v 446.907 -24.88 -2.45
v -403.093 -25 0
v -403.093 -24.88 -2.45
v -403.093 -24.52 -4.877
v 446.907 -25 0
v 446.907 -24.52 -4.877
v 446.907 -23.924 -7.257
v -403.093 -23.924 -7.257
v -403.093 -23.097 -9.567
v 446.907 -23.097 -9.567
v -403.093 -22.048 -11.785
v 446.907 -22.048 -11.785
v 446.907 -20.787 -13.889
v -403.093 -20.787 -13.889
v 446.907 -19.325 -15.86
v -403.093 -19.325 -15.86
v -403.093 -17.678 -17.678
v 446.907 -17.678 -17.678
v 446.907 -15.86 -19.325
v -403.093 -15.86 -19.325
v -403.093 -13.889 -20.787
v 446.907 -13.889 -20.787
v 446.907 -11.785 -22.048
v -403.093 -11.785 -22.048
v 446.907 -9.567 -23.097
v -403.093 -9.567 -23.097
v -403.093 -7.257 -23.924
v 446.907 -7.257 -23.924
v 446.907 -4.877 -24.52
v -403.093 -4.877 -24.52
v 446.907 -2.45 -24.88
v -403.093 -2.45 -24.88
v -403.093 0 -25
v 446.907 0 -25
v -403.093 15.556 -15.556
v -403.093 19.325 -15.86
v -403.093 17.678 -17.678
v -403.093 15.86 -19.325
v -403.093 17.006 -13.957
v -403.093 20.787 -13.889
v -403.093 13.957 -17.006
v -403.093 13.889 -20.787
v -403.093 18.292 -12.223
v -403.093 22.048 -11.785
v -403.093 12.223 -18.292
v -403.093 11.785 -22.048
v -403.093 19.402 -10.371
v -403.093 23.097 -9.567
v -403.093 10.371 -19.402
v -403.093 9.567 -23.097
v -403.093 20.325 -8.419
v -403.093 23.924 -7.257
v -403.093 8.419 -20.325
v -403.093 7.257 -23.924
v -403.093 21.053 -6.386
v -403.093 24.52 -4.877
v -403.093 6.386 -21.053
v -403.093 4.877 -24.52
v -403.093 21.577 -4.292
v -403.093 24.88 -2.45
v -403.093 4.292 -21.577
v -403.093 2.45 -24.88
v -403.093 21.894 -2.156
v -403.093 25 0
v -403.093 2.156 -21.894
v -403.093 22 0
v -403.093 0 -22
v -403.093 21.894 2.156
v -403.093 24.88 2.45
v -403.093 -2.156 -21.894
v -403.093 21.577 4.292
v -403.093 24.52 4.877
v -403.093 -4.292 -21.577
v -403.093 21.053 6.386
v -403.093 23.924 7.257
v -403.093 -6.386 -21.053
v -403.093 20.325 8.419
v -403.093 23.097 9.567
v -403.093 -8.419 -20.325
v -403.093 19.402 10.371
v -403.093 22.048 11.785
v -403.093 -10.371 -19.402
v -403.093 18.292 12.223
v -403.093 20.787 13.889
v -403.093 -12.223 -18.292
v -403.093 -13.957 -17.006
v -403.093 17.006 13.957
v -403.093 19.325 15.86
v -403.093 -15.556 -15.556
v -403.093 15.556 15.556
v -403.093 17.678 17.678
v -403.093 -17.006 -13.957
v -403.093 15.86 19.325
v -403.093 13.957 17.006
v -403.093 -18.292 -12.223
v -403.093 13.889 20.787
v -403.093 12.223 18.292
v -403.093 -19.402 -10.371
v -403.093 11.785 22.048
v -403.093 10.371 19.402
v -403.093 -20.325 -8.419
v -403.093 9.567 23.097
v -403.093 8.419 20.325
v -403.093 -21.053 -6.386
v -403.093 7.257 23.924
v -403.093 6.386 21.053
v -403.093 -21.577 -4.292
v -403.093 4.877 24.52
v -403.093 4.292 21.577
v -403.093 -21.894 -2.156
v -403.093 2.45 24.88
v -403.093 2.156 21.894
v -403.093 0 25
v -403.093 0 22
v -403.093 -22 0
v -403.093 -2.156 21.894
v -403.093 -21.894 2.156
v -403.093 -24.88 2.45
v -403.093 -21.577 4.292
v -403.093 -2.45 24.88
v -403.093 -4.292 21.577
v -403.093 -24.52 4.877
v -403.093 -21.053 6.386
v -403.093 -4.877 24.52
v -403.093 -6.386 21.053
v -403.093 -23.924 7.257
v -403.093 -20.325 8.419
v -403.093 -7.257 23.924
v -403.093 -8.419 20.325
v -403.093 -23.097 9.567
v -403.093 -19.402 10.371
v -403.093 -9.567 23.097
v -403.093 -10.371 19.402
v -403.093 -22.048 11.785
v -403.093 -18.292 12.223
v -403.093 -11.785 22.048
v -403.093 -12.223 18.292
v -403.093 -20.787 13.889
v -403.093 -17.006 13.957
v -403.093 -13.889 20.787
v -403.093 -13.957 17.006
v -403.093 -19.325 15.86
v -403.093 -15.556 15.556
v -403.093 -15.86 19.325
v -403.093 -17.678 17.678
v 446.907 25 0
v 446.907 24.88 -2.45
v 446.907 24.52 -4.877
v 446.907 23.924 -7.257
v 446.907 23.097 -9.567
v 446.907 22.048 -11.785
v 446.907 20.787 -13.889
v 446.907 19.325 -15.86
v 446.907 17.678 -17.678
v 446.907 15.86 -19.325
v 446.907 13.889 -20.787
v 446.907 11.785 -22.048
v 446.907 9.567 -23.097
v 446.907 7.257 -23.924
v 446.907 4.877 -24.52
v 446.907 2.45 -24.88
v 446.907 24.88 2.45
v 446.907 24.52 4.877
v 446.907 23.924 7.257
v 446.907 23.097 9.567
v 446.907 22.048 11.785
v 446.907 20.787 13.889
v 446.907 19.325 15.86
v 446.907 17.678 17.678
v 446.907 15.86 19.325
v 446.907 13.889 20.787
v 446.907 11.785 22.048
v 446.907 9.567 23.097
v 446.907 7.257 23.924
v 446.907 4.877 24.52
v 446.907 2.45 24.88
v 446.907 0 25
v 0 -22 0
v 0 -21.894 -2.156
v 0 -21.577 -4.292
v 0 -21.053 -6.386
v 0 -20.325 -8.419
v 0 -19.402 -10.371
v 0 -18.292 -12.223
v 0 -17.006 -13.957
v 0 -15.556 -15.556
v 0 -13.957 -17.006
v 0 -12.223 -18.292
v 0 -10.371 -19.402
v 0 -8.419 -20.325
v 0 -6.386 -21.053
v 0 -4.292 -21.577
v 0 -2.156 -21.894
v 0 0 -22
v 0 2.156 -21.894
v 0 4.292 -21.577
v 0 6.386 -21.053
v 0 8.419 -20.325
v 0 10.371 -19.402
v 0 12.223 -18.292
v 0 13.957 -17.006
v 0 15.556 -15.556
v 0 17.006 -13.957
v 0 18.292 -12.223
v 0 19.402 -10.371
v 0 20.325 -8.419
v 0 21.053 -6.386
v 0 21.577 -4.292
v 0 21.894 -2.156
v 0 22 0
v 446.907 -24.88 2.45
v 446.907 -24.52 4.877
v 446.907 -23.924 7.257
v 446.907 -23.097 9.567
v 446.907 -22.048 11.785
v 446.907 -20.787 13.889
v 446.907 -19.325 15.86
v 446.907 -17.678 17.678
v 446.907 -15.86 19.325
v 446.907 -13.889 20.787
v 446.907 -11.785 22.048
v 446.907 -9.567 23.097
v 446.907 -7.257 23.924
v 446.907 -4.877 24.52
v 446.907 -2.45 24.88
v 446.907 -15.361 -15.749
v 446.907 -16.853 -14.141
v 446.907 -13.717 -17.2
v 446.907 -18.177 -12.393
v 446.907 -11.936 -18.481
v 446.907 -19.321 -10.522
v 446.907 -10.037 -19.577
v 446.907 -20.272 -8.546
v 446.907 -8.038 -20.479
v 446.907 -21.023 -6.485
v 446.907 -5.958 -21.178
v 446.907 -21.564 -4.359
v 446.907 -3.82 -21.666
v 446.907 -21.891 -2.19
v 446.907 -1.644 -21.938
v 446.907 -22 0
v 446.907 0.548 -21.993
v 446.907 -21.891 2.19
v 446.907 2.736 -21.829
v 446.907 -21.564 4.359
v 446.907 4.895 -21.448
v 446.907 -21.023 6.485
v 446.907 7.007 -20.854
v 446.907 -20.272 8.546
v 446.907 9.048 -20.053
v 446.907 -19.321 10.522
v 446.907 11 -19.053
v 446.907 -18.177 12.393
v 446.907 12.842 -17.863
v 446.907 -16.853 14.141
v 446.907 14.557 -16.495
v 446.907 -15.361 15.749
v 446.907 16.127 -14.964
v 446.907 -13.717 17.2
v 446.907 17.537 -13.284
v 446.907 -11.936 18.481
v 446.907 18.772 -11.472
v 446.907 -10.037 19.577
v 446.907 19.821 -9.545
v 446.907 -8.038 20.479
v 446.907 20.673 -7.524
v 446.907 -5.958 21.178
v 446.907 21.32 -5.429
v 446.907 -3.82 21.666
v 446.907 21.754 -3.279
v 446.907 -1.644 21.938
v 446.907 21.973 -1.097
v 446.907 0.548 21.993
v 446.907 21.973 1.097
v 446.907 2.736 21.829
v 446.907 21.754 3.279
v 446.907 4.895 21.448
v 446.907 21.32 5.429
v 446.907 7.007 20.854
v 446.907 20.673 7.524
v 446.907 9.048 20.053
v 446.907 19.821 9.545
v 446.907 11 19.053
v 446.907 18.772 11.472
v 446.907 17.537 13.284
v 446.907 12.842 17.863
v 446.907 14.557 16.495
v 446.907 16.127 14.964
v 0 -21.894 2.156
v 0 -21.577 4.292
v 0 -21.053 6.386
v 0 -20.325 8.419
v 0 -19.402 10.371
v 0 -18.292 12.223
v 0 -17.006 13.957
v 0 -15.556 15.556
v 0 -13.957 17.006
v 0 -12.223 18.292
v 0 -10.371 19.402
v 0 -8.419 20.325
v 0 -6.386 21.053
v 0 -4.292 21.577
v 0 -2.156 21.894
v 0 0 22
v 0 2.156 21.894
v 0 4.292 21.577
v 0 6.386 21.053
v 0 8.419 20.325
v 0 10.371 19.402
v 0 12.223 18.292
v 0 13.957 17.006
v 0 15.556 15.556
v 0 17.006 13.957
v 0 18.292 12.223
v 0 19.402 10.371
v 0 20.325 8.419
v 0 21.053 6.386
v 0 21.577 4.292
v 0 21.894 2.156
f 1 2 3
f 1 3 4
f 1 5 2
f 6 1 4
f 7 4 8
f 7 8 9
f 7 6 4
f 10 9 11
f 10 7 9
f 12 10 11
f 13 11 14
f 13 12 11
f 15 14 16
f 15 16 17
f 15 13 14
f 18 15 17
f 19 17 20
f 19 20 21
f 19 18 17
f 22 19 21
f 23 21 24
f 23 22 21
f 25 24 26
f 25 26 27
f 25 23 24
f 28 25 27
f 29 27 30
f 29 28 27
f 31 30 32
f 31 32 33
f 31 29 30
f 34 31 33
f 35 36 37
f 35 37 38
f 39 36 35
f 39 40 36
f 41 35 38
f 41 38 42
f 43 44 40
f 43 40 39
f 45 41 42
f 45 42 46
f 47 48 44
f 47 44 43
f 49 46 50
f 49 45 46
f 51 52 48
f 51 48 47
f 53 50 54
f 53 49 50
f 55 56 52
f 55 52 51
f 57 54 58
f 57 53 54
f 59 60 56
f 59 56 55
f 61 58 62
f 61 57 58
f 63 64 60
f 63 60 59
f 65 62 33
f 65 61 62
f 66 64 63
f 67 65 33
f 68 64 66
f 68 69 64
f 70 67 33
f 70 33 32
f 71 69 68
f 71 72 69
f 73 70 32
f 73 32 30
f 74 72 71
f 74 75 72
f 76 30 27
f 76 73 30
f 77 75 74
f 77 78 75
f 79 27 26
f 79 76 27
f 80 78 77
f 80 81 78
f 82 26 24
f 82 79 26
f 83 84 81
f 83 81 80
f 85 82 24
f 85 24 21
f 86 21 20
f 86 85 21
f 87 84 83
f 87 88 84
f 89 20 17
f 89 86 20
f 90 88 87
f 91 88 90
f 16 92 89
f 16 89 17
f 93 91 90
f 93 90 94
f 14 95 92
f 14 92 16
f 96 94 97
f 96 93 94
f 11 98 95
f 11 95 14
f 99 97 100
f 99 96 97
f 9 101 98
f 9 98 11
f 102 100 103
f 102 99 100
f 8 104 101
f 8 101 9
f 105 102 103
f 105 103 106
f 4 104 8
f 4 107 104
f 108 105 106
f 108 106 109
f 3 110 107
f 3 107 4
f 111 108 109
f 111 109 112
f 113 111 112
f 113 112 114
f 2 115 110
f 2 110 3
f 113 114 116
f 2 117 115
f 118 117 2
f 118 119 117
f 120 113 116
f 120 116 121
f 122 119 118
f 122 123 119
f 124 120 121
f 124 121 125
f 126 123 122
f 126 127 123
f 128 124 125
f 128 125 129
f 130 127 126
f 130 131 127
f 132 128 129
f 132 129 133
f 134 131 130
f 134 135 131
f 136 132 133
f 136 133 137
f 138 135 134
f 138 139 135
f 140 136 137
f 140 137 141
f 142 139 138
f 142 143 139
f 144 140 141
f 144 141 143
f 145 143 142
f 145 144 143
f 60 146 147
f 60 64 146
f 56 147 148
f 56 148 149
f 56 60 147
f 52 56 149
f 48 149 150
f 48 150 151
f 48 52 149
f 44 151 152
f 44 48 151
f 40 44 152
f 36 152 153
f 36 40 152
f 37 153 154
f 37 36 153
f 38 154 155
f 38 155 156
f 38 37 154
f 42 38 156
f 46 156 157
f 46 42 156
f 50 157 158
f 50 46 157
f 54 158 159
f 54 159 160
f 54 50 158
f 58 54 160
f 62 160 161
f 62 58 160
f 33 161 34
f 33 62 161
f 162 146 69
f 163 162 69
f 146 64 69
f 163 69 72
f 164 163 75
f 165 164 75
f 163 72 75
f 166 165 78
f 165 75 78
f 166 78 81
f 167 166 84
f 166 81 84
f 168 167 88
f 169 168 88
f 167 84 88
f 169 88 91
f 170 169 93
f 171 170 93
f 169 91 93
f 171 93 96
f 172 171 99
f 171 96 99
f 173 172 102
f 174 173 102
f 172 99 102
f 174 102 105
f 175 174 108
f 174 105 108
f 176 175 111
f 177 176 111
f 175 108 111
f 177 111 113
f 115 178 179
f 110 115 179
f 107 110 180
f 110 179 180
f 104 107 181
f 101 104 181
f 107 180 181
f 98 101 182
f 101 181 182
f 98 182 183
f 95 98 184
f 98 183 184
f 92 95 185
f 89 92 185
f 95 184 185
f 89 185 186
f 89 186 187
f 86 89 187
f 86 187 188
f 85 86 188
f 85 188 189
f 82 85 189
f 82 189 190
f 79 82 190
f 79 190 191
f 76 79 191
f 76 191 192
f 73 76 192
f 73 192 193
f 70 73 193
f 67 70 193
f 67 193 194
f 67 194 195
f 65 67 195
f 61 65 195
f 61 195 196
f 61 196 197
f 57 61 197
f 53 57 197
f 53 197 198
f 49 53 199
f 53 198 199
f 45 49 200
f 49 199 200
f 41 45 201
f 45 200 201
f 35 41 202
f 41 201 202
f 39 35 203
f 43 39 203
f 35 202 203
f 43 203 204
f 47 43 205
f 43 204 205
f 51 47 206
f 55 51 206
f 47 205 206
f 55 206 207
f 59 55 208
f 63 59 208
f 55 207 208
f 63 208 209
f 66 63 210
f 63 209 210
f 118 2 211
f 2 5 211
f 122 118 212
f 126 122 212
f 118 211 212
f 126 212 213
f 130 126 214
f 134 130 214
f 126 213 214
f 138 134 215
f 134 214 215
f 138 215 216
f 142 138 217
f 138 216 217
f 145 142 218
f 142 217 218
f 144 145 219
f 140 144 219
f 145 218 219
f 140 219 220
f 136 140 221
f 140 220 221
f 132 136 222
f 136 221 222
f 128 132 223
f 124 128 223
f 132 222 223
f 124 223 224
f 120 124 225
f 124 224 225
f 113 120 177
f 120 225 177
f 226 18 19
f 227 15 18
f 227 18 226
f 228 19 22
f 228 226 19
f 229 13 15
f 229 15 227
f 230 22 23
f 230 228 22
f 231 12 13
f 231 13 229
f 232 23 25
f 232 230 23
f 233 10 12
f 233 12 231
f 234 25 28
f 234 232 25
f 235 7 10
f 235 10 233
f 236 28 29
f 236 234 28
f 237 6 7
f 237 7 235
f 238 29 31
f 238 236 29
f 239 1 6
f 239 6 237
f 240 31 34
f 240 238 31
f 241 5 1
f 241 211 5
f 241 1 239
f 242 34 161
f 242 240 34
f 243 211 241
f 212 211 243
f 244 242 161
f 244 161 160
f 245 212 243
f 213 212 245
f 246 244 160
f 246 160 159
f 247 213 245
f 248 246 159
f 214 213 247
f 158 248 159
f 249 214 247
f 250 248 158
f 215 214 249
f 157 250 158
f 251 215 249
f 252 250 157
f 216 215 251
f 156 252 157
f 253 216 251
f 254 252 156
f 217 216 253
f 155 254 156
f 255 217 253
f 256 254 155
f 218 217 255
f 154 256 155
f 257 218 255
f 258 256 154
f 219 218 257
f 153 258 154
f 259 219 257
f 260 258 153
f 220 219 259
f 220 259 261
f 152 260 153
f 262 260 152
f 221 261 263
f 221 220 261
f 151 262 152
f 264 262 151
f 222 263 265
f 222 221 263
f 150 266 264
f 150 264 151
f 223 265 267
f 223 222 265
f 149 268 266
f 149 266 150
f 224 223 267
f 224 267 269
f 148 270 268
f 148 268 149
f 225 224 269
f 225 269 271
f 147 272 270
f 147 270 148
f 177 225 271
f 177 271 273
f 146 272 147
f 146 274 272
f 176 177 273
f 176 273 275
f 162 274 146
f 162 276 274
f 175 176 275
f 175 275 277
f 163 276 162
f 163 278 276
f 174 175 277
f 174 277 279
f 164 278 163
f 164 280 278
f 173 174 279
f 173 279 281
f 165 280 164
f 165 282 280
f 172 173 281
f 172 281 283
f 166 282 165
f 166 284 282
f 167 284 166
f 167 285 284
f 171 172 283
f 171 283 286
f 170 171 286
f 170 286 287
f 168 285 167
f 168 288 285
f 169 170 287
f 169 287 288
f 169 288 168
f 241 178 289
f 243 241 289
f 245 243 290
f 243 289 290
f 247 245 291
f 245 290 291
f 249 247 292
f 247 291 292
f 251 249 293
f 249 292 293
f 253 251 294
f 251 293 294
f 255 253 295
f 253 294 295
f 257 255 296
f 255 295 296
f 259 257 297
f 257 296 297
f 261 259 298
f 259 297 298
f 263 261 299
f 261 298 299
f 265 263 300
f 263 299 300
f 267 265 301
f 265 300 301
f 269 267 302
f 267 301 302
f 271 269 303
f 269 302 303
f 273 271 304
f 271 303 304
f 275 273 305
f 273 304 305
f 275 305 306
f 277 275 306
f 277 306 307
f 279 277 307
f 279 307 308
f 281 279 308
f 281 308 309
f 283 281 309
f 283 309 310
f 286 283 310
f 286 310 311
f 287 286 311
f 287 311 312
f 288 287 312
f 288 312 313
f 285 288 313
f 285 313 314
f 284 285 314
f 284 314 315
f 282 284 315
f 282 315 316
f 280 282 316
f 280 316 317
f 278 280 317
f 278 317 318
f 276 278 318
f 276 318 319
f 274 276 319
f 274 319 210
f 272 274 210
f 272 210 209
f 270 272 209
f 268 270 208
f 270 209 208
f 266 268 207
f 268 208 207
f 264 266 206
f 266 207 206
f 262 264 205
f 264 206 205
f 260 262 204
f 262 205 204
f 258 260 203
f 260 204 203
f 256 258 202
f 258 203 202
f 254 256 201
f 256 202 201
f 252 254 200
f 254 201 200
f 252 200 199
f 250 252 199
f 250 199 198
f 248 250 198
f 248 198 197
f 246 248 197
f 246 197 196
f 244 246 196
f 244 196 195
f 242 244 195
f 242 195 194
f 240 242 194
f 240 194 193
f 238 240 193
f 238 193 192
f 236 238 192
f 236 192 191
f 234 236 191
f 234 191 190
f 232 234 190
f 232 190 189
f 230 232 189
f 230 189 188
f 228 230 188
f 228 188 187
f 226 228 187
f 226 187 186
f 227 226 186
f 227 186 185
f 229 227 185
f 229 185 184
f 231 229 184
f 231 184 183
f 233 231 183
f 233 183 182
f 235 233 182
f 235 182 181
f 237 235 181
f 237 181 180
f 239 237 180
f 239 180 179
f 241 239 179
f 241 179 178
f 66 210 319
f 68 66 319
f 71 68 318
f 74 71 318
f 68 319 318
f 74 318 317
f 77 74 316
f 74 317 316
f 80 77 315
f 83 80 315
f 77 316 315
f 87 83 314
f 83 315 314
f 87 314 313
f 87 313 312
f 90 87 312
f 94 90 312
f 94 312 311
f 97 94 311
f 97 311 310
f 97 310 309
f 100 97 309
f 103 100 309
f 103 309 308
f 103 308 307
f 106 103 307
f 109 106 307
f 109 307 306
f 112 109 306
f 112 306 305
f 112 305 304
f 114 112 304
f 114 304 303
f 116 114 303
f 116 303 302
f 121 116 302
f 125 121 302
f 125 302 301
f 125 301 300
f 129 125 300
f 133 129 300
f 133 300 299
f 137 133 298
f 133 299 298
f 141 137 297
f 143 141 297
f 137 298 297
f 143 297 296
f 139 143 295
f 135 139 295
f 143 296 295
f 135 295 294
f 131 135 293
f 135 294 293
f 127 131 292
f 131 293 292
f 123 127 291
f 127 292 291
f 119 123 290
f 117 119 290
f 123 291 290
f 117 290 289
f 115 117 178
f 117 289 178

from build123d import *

# Parameters (mm, degrees)
F1_DEPTH = 25
F2_R     = 24.99999
F4_D     = 44
F4_DEPTH = 403.0937720853
F6_D     = 44


# Not quite as in the source:
# - a fillet or chamfer is up to 0.001 mm smaller than in the source, because OpenCascade refuses the exact size


with BuildPart() as f1:
    # F0 (on Top) → F1 (new body, symmetric)
    with BuildSketch(Plane.XY):
        Polygon((446.9072279147, 0), (0, 0), (-403.0927720853, 0), (-403.0927720853, -25), (446.9072279147, -25), align=None)
        Polygon((-403.0927720853, 0), (0, 0), (446.9072279147, 0), (446.9072279147, 25), (-403.0927720853, 25), align=None)
    extrude(amount=F1_DEPTH, both=True)

    # F2 (radius 25 in the source; OpenCascade refuses exactly that, so slightly less here)
    f2_edges = [f1.edges().sort_by_distance(p)[0] for p in [
        (21.907228, -25, -25),
        (21.907228, 25, -25),
        (21.907228, 25, 25),
        (21.907228, -25, 25),
    ]]
    fillet(f2_edges, radius=F2_R)

    # F4 (through all, one way)
    with BuildSketch(Plane.YZ):
        with Locations((0, 0)):
            Circle(F4_D / 2)
    extrude(amount=-F4_DEPTH, mode=Mode.SUBTRACT)

    # F6 (through all)
    with Locations(Plane.YZ.offset(446.9072279147)):
        with Locations((0, 0)):
            Hole(F6_D / 2)


solid = f1.part
